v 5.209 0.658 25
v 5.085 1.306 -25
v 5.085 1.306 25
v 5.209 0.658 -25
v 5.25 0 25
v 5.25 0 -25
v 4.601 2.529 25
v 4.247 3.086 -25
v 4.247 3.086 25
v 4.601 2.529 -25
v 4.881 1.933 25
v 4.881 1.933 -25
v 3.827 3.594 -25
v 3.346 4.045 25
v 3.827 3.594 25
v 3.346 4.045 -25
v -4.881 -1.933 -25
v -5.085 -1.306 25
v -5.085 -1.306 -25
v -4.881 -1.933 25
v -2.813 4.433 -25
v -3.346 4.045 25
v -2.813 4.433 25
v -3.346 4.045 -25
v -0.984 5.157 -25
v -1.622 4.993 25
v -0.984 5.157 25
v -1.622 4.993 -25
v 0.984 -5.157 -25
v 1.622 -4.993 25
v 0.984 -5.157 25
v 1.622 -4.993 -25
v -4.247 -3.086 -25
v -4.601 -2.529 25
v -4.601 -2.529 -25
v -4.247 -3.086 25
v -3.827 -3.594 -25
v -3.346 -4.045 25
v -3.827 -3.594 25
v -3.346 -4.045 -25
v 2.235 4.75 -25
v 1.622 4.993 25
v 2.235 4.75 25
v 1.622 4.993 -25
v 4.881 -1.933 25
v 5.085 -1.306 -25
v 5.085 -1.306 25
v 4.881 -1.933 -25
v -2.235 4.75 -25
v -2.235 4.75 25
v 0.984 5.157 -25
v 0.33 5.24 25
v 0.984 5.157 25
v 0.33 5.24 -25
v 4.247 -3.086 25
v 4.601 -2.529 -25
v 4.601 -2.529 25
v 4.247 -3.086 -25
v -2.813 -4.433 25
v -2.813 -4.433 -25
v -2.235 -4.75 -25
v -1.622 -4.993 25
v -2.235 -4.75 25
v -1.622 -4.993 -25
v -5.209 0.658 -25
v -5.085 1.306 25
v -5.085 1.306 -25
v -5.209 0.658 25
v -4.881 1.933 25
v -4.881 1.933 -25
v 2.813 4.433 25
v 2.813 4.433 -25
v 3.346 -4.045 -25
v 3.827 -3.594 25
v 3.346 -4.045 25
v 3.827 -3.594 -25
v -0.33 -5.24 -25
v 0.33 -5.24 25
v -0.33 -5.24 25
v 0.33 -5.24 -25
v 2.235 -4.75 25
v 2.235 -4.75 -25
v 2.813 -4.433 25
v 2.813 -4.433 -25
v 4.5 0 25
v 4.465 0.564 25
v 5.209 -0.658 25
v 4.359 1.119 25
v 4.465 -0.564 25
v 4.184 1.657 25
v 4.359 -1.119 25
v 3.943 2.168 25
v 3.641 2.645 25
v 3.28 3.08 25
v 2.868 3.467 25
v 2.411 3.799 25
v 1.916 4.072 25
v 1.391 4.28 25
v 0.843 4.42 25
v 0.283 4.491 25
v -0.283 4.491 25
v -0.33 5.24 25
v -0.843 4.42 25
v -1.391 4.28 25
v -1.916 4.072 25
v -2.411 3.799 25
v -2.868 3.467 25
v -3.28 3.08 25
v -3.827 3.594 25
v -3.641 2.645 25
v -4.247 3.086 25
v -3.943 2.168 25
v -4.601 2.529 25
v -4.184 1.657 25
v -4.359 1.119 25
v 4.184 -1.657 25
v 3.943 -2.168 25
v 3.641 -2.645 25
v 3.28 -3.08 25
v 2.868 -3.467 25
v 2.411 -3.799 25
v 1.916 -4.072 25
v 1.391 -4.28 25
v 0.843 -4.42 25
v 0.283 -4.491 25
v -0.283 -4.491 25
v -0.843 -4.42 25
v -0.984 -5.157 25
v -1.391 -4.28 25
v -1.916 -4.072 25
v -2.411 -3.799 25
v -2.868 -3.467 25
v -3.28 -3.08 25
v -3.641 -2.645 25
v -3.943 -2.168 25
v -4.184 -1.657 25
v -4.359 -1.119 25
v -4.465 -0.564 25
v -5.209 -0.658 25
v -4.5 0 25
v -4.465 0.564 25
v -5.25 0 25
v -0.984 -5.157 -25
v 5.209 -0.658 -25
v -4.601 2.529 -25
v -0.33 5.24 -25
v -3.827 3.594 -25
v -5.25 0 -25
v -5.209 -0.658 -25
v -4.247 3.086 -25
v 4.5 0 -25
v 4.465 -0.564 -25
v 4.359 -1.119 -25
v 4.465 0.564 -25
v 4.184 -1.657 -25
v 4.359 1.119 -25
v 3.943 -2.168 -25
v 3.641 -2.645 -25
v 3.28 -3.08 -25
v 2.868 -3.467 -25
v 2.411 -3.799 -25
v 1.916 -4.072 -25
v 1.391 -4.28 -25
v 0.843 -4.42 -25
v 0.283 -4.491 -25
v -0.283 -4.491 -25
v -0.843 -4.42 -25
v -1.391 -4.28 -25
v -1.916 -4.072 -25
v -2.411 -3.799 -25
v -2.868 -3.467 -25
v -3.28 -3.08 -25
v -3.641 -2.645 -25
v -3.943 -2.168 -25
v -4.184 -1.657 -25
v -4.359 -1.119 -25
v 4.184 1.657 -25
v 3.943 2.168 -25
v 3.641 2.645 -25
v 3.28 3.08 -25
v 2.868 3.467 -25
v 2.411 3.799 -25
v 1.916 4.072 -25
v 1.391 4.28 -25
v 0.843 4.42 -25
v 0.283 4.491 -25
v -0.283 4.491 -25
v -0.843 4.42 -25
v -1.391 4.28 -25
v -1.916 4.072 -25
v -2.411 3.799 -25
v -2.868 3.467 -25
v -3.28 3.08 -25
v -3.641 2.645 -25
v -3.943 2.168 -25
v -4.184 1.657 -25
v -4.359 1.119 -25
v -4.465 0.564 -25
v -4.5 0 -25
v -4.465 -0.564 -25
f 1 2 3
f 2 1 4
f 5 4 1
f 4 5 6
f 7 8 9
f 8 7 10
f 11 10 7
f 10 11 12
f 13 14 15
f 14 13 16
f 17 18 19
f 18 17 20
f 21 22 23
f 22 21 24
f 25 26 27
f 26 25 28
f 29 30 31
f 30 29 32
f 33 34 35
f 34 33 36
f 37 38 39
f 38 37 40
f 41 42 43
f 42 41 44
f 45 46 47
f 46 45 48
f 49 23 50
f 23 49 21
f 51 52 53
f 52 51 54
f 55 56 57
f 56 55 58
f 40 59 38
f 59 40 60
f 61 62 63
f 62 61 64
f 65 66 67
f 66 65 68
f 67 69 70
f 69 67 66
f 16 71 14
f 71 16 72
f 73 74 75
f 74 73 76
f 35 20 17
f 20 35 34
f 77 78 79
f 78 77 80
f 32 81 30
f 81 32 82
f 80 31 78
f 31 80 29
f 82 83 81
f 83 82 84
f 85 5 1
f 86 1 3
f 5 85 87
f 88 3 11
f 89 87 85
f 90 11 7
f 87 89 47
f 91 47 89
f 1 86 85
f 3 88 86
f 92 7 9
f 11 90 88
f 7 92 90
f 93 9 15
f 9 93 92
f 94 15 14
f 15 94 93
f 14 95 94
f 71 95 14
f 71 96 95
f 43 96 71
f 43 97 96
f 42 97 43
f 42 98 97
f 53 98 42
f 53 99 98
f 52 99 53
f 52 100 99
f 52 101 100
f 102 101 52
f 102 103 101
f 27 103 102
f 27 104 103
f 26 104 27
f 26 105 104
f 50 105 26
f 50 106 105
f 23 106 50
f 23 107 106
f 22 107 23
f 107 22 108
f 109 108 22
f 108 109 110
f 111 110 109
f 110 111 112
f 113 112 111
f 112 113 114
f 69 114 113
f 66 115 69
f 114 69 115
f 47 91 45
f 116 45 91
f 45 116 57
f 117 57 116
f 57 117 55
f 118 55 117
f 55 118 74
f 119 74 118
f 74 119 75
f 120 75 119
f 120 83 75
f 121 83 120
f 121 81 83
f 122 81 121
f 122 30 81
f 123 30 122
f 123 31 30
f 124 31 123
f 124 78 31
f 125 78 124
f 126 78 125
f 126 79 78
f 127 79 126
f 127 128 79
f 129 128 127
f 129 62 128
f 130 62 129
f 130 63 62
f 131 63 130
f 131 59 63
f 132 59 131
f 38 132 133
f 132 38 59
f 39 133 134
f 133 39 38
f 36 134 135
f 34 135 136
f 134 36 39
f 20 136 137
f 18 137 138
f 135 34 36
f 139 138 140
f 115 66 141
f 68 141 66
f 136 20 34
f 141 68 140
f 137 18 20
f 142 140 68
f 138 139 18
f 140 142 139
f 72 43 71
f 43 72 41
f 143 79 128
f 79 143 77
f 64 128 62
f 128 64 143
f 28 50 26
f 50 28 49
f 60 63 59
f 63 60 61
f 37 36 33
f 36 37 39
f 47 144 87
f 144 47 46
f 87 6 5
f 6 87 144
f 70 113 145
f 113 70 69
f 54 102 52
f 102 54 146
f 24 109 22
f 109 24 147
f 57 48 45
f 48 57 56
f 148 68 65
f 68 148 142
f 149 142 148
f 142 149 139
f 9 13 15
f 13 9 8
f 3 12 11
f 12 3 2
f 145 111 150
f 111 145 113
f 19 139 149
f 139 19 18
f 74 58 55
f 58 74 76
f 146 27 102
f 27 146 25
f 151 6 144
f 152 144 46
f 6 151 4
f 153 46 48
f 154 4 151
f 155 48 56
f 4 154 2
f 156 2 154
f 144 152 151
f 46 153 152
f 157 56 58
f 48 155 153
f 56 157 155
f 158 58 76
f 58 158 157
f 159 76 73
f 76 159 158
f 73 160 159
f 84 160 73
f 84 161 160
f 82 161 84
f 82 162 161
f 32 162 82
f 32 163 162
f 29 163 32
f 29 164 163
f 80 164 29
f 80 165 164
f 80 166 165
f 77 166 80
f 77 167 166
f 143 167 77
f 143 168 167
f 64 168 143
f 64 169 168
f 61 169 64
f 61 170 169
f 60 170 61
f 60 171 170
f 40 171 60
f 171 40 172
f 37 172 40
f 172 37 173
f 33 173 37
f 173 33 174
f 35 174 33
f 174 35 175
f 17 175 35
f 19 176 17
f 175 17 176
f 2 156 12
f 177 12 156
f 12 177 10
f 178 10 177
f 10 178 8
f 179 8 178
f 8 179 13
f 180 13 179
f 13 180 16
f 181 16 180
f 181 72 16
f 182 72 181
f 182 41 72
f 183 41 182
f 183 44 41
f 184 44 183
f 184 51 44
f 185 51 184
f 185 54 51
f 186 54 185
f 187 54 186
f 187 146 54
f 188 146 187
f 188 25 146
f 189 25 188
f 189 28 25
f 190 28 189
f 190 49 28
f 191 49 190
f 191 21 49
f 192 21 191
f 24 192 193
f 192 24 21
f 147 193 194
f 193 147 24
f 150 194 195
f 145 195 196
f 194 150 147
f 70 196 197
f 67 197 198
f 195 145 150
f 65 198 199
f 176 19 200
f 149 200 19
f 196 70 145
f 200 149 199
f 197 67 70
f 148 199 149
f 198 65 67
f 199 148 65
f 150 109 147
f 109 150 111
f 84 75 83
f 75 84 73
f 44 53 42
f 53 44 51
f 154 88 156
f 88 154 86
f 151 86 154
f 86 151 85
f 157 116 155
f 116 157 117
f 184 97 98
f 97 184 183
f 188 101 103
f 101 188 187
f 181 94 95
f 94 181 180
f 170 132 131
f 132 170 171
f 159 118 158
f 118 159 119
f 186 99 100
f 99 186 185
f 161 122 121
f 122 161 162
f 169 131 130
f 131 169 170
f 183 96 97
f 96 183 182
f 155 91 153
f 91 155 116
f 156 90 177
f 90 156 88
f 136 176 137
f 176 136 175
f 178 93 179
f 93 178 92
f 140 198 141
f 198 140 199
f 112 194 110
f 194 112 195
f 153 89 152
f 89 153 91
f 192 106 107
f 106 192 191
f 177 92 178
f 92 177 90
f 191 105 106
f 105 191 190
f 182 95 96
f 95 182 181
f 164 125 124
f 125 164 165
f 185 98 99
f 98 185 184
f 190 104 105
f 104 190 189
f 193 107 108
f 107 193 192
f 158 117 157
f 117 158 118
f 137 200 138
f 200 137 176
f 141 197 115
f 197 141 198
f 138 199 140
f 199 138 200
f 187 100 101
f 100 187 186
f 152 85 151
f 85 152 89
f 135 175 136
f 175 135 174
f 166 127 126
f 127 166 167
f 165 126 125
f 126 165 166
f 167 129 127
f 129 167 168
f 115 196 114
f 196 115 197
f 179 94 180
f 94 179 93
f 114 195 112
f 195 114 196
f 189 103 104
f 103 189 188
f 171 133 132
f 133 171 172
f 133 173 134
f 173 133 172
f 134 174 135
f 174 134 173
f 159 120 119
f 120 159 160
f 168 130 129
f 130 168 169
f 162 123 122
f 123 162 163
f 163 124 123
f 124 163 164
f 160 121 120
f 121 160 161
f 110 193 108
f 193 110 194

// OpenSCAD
$fn = 50;


difference() {
	union() {
		translate(v = [0, 0, -25.0000000000]) {
			cylinder(h = 50, r = 5.2500000000);
		}
	}
	union() {
		translate(v = [0, 0, -100.0000000000]) {
			cylinder(h = 200, r = 4.5000000000);
		}
	}
}
